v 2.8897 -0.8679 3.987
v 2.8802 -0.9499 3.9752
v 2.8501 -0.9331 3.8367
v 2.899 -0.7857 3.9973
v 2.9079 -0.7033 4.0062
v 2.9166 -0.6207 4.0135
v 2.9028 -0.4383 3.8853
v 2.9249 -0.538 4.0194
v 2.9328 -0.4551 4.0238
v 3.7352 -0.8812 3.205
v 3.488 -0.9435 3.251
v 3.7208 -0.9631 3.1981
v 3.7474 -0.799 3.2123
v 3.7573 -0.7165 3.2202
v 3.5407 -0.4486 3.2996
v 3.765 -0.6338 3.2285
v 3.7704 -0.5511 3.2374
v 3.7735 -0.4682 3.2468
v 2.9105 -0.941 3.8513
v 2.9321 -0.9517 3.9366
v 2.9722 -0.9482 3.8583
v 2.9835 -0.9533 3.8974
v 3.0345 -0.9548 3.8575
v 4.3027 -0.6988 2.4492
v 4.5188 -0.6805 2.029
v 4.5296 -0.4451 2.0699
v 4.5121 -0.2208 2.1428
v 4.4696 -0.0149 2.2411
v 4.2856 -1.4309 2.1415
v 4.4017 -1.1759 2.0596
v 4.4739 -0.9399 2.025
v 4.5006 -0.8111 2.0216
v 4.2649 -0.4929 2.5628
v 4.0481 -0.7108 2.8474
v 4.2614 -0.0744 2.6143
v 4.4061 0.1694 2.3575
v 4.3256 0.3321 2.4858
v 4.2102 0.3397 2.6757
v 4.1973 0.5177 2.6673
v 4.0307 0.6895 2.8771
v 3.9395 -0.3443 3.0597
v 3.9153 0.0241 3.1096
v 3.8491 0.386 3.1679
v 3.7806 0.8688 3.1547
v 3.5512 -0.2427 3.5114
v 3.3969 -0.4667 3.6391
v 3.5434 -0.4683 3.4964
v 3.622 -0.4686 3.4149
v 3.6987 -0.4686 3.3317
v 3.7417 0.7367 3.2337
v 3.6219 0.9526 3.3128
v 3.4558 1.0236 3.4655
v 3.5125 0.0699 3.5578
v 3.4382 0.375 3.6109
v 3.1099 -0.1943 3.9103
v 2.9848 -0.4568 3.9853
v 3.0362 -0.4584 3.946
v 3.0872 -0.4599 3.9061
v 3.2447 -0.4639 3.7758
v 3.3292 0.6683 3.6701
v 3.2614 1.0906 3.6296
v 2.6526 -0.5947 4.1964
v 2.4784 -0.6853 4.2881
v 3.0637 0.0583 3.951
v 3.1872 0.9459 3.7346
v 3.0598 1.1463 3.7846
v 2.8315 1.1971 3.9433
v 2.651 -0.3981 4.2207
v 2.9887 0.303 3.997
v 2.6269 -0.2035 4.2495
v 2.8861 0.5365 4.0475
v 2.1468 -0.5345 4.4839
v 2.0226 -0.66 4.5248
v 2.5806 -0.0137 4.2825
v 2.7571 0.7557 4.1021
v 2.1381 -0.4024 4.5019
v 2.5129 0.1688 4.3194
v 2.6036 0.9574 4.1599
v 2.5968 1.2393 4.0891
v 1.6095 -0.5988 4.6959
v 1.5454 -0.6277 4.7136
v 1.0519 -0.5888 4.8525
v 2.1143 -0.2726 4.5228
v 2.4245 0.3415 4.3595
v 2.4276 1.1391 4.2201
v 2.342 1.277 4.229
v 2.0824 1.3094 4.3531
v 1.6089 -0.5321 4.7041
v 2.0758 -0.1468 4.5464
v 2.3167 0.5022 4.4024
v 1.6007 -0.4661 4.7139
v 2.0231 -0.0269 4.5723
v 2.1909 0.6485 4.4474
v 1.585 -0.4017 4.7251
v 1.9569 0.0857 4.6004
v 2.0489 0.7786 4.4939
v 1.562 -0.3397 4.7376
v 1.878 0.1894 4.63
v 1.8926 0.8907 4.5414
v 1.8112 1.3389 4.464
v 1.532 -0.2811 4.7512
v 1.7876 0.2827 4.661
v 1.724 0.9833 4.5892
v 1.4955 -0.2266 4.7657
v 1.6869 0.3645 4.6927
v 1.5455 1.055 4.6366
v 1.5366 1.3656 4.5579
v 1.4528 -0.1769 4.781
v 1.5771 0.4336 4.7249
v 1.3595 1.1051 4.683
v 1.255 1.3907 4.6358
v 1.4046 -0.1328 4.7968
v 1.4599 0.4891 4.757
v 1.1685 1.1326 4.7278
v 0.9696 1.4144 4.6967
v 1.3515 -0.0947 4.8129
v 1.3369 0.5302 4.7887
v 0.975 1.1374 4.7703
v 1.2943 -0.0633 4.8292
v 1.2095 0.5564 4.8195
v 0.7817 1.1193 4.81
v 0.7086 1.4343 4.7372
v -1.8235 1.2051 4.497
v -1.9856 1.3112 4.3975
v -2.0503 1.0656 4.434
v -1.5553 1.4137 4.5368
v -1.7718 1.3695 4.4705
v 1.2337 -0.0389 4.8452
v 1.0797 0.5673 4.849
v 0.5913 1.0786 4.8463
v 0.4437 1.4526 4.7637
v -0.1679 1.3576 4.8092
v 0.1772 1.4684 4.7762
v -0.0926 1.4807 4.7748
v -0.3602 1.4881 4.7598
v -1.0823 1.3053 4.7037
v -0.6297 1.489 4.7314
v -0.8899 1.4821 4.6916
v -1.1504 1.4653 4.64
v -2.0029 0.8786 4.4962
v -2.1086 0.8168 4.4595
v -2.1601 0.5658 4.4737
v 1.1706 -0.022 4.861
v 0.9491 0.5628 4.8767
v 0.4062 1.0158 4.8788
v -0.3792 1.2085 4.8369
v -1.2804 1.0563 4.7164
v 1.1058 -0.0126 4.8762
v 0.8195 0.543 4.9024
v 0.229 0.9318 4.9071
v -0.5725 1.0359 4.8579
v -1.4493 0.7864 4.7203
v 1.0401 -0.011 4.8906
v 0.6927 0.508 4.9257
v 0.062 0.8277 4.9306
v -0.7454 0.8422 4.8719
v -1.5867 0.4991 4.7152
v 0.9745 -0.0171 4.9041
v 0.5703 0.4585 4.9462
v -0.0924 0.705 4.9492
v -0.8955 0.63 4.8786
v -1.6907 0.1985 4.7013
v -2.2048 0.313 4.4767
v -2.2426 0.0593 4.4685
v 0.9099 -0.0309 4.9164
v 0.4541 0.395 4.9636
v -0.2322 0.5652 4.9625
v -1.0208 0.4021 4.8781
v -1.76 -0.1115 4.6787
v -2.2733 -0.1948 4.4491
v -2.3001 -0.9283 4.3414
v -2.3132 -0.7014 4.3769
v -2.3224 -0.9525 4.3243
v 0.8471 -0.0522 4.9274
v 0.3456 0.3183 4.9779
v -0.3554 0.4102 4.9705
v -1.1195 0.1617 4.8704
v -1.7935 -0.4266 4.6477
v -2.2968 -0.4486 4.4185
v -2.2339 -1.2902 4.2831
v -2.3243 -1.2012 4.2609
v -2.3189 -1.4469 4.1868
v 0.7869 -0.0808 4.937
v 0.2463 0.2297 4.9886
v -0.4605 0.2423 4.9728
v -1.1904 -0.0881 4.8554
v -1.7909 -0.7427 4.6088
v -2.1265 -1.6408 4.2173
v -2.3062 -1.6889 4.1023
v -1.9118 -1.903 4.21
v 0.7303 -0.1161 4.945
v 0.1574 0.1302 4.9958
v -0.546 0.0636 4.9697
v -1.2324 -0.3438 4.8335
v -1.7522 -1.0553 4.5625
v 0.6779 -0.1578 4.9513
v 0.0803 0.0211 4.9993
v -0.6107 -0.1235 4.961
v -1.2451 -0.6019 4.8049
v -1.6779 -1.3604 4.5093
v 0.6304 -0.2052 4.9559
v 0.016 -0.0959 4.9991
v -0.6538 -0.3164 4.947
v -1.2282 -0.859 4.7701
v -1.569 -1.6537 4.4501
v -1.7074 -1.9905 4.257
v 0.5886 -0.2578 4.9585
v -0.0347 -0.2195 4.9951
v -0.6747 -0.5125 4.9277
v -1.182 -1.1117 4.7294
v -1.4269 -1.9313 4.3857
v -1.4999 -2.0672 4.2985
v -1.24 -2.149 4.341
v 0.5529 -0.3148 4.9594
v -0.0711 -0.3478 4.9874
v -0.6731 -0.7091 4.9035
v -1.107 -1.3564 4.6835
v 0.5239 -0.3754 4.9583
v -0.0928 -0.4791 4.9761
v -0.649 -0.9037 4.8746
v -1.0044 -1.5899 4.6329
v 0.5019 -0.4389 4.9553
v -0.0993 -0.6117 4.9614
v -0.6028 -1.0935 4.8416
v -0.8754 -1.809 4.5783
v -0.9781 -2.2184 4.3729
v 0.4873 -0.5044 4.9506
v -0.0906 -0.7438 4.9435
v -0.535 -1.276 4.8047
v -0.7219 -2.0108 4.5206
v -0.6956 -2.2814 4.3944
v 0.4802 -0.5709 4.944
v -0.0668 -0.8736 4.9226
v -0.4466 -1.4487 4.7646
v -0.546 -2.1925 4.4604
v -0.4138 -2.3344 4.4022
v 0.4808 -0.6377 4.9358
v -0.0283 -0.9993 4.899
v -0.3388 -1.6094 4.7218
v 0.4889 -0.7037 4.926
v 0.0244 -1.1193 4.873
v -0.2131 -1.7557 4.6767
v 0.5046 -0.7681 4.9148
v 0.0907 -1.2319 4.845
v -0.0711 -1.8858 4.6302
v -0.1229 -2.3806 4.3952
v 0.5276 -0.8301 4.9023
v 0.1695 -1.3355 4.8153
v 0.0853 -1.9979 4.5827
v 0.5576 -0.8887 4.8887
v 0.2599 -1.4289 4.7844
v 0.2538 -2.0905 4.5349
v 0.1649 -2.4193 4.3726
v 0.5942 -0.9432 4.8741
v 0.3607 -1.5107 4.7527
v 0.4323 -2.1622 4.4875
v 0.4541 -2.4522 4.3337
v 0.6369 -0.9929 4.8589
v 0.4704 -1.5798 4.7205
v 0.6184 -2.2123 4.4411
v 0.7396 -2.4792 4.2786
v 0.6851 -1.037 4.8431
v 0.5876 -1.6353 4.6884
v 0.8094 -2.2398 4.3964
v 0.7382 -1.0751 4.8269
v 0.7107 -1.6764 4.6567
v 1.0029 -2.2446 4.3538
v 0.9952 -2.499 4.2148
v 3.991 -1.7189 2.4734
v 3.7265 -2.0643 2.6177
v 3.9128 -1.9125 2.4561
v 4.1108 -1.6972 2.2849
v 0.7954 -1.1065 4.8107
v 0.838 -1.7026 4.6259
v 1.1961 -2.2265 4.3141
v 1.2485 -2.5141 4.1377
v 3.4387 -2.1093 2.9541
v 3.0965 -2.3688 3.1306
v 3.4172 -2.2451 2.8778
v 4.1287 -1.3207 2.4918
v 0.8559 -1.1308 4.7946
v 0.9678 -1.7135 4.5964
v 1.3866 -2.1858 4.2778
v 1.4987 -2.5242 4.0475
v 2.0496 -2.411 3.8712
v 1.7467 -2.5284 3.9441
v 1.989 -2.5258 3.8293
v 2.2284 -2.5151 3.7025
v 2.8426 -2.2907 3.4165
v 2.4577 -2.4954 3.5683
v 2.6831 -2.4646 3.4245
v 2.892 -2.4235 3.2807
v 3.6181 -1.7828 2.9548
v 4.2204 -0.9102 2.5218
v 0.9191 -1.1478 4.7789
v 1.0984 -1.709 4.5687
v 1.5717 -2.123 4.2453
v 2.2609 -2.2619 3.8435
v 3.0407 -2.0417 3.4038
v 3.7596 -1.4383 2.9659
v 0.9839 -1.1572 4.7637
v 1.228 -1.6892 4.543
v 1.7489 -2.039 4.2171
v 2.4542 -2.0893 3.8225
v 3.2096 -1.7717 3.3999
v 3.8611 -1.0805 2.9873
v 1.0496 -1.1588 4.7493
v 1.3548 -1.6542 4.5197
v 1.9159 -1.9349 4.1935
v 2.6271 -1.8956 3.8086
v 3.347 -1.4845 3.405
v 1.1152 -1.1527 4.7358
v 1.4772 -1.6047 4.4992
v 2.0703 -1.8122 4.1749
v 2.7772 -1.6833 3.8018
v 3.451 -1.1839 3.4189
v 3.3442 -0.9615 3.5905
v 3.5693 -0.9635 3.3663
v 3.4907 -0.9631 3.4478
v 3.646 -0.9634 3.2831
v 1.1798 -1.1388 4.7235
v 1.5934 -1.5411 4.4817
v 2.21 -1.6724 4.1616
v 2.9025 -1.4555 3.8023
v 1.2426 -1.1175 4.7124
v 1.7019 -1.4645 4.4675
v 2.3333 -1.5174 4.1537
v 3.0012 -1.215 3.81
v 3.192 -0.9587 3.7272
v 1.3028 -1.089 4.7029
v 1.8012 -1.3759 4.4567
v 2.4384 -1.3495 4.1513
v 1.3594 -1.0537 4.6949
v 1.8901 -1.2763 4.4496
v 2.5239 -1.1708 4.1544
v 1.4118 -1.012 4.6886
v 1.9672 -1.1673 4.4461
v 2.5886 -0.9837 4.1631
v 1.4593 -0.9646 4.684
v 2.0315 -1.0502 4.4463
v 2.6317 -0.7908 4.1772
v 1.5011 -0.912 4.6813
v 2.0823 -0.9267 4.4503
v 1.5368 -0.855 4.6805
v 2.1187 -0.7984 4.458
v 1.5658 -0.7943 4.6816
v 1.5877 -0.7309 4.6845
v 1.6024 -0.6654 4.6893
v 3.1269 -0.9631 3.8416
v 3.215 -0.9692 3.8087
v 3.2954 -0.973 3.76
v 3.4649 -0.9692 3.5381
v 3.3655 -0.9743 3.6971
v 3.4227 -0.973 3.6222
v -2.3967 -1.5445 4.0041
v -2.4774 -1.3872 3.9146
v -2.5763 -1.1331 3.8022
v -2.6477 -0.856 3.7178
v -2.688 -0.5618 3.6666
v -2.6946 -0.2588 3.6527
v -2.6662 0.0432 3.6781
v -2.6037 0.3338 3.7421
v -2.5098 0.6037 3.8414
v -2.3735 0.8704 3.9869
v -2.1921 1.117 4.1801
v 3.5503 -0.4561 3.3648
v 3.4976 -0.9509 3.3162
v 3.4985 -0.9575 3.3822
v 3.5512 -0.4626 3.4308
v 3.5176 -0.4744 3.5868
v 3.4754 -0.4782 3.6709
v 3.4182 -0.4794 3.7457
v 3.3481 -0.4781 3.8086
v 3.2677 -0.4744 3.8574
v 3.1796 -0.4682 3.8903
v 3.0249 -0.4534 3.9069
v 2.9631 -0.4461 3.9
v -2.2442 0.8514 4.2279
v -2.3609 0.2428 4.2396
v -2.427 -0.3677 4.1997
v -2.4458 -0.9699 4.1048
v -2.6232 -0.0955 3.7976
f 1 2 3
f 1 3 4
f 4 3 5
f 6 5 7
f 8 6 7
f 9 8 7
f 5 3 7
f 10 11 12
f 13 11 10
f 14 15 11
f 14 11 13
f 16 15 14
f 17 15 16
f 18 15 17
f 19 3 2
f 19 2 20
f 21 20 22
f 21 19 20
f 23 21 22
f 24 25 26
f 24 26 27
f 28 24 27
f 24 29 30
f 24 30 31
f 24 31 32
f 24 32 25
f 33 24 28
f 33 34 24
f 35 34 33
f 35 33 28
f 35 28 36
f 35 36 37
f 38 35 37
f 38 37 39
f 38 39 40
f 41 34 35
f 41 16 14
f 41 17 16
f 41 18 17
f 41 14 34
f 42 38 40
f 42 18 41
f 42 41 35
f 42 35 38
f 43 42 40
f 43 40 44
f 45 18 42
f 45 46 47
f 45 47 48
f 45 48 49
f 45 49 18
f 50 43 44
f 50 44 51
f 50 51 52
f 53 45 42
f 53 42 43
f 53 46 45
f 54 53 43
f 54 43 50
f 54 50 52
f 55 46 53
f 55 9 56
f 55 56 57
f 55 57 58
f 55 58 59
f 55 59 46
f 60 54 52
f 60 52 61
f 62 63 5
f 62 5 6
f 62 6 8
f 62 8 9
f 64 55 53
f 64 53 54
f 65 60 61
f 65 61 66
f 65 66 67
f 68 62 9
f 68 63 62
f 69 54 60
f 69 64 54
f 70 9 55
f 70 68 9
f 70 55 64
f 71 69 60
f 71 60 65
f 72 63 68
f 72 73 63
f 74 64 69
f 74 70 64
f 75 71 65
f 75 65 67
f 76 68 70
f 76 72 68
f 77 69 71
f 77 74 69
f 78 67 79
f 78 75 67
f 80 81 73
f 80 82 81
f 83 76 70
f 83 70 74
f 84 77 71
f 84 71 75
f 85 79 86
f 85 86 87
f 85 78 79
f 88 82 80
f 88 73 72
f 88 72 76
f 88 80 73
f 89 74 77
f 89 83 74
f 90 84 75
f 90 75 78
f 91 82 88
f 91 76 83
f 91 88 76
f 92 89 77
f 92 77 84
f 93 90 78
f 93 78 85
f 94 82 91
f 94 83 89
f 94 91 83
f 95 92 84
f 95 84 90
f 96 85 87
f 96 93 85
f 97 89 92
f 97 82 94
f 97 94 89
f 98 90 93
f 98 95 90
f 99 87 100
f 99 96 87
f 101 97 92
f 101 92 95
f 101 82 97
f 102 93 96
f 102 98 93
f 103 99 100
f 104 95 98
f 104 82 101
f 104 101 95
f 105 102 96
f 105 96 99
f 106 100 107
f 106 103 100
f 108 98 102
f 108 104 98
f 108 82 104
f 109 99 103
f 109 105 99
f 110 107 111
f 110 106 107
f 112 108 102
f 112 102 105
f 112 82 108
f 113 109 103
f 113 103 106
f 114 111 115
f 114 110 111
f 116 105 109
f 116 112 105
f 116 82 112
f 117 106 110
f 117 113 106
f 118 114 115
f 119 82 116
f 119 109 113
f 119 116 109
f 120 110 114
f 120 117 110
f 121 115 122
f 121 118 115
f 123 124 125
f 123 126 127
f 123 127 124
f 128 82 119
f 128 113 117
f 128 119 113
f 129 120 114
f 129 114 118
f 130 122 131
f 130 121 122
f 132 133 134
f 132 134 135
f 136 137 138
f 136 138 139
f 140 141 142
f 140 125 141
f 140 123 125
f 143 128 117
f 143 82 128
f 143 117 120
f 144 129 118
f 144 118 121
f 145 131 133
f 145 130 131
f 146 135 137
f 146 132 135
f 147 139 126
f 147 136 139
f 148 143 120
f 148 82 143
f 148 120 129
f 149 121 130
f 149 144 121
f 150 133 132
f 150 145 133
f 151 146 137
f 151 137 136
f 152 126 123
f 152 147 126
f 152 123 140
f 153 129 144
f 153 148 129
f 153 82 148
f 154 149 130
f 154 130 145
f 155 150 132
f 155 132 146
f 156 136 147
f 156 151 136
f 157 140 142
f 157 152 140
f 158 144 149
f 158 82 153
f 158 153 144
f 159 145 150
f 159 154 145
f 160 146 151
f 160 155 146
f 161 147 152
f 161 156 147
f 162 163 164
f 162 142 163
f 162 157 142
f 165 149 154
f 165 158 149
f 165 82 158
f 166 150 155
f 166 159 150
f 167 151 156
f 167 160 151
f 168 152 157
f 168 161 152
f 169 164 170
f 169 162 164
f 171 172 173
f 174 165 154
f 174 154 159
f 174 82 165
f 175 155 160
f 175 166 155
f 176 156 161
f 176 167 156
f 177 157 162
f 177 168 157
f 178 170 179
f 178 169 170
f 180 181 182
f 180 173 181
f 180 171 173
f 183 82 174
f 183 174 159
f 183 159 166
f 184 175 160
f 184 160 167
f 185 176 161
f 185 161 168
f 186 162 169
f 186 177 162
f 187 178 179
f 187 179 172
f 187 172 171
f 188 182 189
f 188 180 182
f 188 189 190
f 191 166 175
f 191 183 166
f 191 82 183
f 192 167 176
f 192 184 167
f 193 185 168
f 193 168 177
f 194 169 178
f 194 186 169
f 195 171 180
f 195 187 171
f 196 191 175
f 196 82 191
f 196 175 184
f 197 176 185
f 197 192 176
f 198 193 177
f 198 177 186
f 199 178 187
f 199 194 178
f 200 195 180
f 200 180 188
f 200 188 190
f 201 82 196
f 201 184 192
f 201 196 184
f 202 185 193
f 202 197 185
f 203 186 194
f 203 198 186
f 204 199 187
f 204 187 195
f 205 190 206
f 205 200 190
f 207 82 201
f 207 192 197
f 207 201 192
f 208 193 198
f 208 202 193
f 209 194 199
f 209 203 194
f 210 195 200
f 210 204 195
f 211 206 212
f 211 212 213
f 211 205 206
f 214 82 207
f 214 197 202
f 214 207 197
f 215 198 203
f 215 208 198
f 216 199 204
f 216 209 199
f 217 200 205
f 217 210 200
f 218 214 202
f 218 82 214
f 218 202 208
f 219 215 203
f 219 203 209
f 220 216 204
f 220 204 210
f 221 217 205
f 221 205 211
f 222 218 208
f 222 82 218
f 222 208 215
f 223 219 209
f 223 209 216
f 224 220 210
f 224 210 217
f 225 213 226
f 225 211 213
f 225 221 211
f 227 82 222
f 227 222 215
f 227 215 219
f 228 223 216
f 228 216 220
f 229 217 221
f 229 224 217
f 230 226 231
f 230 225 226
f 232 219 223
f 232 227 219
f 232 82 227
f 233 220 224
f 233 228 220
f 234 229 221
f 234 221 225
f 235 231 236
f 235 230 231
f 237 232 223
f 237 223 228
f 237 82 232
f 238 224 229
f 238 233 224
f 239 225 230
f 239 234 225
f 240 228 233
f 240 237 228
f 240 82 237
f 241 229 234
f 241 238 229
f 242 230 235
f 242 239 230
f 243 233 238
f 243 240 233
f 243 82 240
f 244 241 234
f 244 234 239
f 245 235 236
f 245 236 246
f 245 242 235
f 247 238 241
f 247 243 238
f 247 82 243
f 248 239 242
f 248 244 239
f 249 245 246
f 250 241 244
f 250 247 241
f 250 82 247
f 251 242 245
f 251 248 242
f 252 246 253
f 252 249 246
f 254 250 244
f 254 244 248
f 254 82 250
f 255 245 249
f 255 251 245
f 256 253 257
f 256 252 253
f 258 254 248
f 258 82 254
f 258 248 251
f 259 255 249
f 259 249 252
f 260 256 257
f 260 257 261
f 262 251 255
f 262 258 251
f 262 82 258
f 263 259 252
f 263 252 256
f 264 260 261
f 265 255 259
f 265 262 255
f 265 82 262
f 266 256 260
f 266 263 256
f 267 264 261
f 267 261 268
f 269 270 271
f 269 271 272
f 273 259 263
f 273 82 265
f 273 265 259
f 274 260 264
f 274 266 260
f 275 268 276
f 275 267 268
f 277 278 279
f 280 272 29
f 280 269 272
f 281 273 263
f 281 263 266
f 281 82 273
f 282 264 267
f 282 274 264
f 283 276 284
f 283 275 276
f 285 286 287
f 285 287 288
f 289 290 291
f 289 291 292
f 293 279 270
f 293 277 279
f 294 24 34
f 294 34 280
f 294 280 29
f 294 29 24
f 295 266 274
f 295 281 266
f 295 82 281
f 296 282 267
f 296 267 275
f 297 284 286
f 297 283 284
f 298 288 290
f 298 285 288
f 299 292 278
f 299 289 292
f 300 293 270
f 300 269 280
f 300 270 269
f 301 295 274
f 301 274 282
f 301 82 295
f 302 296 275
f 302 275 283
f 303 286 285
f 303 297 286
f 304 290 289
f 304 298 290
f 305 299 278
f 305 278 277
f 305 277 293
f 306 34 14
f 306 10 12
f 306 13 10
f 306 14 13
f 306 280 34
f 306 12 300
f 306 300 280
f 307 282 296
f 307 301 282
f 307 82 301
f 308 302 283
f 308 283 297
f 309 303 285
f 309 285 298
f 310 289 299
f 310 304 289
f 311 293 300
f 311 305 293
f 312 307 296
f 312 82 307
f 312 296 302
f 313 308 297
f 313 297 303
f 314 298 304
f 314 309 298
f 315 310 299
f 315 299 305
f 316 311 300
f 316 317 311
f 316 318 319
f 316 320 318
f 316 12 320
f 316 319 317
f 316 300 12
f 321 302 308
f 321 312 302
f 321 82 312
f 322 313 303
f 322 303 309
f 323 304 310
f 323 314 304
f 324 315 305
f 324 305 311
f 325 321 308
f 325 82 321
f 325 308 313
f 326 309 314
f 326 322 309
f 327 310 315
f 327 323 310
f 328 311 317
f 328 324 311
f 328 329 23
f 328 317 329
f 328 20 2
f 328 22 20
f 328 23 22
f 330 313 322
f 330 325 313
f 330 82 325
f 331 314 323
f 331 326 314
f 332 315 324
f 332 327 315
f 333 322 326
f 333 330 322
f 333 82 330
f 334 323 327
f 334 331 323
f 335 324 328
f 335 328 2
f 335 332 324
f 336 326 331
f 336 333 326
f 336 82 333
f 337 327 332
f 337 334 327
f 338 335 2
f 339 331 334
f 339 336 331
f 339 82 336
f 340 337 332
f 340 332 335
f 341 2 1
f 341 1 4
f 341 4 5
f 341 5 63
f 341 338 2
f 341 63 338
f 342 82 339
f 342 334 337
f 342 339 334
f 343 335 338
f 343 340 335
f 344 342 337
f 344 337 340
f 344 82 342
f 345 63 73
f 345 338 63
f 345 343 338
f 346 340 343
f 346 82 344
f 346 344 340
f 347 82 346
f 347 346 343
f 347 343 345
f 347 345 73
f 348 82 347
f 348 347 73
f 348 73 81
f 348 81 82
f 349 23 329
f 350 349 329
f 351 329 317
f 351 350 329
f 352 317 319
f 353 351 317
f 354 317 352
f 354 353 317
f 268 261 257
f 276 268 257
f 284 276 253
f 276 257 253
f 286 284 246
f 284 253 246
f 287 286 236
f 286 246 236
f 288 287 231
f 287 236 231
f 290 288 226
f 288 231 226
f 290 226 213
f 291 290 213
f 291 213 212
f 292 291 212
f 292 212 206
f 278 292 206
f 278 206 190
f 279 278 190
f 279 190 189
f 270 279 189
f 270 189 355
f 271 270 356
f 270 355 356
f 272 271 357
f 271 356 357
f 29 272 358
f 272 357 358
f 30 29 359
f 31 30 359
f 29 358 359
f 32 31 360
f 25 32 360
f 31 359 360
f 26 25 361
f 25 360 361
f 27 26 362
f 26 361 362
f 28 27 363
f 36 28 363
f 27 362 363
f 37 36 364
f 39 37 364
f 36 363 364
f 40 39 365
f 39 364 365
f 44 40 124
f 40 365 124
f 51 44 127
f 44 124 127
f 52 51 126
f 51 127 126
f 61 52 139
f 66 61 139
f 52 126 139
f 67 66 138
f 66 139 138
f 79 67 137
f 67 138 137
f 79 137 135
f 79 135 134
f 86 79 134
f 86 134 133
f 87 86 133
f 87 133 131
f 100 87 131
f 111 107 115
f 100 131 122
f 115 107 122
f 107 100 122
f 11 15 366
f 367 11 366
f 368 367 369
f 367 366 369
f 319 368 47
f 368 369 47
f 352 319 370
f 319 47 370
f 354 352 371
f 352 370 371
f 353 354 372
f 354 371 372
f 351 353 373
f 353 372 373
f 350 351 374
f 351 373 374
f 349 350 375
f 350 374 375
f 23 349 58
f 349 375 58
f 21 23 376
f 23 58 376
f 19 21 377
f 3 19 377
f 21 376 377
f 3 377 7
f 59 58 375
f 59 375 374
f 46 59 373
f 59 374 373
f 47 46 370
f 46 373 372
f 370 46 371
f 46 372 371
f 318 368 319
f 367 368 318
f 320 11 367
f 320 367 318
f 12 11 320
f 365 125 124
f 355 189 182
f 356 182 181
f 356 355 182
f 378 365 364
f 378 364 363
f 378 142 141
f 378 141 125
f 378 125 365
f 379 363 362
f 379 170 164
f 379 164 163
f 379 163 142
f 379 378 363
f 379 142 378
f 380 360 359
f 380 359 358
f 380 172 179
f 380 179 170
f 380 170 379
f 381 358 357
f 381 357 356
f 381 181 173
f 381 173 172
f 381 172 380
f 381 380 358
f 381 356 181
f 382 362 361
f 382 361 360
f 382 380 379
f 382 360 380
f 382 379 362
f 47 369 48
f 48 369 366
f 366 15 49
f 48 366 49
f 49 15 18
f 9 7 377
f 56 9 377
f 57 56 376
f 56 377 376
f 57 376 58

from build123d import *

# Parameters (mm, degrees)
CYLINDER001_R             = 0.5
CYLINDER001_DEPTH         = 0.5
CYLINDER001_ROLL_ANGLE    = 90
BOX_W                     = 1
BOX_H                     = 0.5
BOX_DEPTH                 = 4
CYLINDER_R                = 2
CYLINDER_DEPTH            = 10
CYLINDER_PITCH_ANGLE      = 90
SPHERE001_ROLL_ANGLE      = 112.509495
SPHERE001_PITCH_ANGLE     = -50.257982
SPHERE001_PLACEMENT_ANGLE = -48.327625
FUSION_ROLL_ANGLE         = 5.722395
FUSION_PITCH_ANGLE        = 12.745212
FUSION_PLACEMENT_ANGLE    = -4.811312


with BuildPart() as cylinder001:
    # Cylinder001 → Cylinder001 (new body)
    with BuildSketch(Plane.XY):
        Circle(CYLINDER001_R)
    extrude(amount=CYLINDER001_DEPTH)


with BuildPart() as cylinder001_1:
    # Cylinder001 roll: moved
    add(cylinder001.part.rotate(Axis((0, 0, 0), (1, 0, 0)), CYLINDER001_ROLL_ANGLE))


with BuildPart() as cylinder001_2:
    # Cylinder001 placement: moved
    add(cylinder001_1.part.moved(Location((2.25, 0.25, 4))))


with BuildPart() as cube:
    # Box → Box (new body)
    with BuildSketch(Plane(origin=(2, -0.25, 4), x_dir=(1, 0, 0), z_dir=(0, 0, 1))):
        with Locations((0.5, 0.25)):
            Rectangle(BOX_W, BOX_H)
    extrude(amount=BOX_DEPTH)


with BuildPart() as cylinder:
    # Cylinder → Cylinder (new body)
    with BuildSketch(Plane.XY):
        Circle(CYLINDER_R)
    extrude(amount=CYLINDER_DEPTH)


with BuildPart() as cylinder_1:
    # Cylinder pitch: moved
    add(cylinder.part.rotate(Axis((0, 0, 0), (0, 1, 0)), CYLINDER_PITCH_ANGLE))


with BuildPart() as cylinder_2:
    # Cylinder placement: moved
    add(cylinder_1.part.moved(Location((-5, 0, 5))))


with BuildPart() as common:
    # Sphere → Sphere (revolve)
    with BuildSketch(Plane.XZ):
        with BuildLine():
            ThreePointArc((0, -5), (5, 0), (0, 5))
            Line((0, 5), (0, -5))
        make_face()
    revolve(axis=Axis((0, 0, 0), (0, 0, 1)))

    # Common: intersect Cylinder
    add(cylinder_2.part, mode=Mode.INTERSECT)


with BuildPart() as fusion:
    # Sphere001 → Sphere001 (revolve)
    with BuildSketch(Plane.XZ):
        with BuildLine():
            ThreePointArc((0, -5.5), (5.5, 0), (0, 5.5))
            Line((0, 5.5), (0, -5.5))
        make_face()
    revolve(axis=Axis((0, 0, 0), (0, 0, 1)))


with BuildPart() as fusion_1:
    # Sphere001 roll: moved
    add(fusion.part.rotate(Axis((0, 0, 0), (1, 0, 0)), SPHERE001_ROLL_ANGLE))


with BuildPart() as fusion_2:
    # Sphere001 pitch: moved
    add(fusion_1.part.rotate(Axis((0, 0, 0), (0, 1, 0)), SPHERE001_PITCH_ANGLE))


with BuildPart() as fusion_3:
    # Sphere001 placement: moved
    add(fusion_2.part.moved(Location((1.999999, -0.001152, 2))).rotate(Axis((1.999999, -0.001152, 2), (0, 0, 1)), SPHERE001_PLACEMENT_ANGLE))

    # Common001: intersect Common
    add(common.part, mode=Mode.INTERSECT)

    # Cut: cut Cube
    add(cube.part, mode=Mode.SUBTRACT)

    # Fusion: union Cylinder001
    add(cylinder001_2.part)


with BuildPart() as fusion_4:
    # Fusion roll: moved
    add(fusion_3.part.rotate(Axis((0, 0, 0), (1, 0, 0)), FUSION_ROLL_ANGLE))


with BuildPart() as fusion_5:
    # Fusion pitch: moved
    add(fusion_4.part.rotate(Axis((0, 0, 0), (0, 1, 0)), FUSION_PITCH_ANGLE))


with BuildPart() as fusion_6:
    # Fusion placement: moved
    add(fusion_5.part.rotate(Axis((0, 0, 0), (0, 0, 1)), FUSION_PLACEMENT_ANGLE))


solid = fusion_6.part
